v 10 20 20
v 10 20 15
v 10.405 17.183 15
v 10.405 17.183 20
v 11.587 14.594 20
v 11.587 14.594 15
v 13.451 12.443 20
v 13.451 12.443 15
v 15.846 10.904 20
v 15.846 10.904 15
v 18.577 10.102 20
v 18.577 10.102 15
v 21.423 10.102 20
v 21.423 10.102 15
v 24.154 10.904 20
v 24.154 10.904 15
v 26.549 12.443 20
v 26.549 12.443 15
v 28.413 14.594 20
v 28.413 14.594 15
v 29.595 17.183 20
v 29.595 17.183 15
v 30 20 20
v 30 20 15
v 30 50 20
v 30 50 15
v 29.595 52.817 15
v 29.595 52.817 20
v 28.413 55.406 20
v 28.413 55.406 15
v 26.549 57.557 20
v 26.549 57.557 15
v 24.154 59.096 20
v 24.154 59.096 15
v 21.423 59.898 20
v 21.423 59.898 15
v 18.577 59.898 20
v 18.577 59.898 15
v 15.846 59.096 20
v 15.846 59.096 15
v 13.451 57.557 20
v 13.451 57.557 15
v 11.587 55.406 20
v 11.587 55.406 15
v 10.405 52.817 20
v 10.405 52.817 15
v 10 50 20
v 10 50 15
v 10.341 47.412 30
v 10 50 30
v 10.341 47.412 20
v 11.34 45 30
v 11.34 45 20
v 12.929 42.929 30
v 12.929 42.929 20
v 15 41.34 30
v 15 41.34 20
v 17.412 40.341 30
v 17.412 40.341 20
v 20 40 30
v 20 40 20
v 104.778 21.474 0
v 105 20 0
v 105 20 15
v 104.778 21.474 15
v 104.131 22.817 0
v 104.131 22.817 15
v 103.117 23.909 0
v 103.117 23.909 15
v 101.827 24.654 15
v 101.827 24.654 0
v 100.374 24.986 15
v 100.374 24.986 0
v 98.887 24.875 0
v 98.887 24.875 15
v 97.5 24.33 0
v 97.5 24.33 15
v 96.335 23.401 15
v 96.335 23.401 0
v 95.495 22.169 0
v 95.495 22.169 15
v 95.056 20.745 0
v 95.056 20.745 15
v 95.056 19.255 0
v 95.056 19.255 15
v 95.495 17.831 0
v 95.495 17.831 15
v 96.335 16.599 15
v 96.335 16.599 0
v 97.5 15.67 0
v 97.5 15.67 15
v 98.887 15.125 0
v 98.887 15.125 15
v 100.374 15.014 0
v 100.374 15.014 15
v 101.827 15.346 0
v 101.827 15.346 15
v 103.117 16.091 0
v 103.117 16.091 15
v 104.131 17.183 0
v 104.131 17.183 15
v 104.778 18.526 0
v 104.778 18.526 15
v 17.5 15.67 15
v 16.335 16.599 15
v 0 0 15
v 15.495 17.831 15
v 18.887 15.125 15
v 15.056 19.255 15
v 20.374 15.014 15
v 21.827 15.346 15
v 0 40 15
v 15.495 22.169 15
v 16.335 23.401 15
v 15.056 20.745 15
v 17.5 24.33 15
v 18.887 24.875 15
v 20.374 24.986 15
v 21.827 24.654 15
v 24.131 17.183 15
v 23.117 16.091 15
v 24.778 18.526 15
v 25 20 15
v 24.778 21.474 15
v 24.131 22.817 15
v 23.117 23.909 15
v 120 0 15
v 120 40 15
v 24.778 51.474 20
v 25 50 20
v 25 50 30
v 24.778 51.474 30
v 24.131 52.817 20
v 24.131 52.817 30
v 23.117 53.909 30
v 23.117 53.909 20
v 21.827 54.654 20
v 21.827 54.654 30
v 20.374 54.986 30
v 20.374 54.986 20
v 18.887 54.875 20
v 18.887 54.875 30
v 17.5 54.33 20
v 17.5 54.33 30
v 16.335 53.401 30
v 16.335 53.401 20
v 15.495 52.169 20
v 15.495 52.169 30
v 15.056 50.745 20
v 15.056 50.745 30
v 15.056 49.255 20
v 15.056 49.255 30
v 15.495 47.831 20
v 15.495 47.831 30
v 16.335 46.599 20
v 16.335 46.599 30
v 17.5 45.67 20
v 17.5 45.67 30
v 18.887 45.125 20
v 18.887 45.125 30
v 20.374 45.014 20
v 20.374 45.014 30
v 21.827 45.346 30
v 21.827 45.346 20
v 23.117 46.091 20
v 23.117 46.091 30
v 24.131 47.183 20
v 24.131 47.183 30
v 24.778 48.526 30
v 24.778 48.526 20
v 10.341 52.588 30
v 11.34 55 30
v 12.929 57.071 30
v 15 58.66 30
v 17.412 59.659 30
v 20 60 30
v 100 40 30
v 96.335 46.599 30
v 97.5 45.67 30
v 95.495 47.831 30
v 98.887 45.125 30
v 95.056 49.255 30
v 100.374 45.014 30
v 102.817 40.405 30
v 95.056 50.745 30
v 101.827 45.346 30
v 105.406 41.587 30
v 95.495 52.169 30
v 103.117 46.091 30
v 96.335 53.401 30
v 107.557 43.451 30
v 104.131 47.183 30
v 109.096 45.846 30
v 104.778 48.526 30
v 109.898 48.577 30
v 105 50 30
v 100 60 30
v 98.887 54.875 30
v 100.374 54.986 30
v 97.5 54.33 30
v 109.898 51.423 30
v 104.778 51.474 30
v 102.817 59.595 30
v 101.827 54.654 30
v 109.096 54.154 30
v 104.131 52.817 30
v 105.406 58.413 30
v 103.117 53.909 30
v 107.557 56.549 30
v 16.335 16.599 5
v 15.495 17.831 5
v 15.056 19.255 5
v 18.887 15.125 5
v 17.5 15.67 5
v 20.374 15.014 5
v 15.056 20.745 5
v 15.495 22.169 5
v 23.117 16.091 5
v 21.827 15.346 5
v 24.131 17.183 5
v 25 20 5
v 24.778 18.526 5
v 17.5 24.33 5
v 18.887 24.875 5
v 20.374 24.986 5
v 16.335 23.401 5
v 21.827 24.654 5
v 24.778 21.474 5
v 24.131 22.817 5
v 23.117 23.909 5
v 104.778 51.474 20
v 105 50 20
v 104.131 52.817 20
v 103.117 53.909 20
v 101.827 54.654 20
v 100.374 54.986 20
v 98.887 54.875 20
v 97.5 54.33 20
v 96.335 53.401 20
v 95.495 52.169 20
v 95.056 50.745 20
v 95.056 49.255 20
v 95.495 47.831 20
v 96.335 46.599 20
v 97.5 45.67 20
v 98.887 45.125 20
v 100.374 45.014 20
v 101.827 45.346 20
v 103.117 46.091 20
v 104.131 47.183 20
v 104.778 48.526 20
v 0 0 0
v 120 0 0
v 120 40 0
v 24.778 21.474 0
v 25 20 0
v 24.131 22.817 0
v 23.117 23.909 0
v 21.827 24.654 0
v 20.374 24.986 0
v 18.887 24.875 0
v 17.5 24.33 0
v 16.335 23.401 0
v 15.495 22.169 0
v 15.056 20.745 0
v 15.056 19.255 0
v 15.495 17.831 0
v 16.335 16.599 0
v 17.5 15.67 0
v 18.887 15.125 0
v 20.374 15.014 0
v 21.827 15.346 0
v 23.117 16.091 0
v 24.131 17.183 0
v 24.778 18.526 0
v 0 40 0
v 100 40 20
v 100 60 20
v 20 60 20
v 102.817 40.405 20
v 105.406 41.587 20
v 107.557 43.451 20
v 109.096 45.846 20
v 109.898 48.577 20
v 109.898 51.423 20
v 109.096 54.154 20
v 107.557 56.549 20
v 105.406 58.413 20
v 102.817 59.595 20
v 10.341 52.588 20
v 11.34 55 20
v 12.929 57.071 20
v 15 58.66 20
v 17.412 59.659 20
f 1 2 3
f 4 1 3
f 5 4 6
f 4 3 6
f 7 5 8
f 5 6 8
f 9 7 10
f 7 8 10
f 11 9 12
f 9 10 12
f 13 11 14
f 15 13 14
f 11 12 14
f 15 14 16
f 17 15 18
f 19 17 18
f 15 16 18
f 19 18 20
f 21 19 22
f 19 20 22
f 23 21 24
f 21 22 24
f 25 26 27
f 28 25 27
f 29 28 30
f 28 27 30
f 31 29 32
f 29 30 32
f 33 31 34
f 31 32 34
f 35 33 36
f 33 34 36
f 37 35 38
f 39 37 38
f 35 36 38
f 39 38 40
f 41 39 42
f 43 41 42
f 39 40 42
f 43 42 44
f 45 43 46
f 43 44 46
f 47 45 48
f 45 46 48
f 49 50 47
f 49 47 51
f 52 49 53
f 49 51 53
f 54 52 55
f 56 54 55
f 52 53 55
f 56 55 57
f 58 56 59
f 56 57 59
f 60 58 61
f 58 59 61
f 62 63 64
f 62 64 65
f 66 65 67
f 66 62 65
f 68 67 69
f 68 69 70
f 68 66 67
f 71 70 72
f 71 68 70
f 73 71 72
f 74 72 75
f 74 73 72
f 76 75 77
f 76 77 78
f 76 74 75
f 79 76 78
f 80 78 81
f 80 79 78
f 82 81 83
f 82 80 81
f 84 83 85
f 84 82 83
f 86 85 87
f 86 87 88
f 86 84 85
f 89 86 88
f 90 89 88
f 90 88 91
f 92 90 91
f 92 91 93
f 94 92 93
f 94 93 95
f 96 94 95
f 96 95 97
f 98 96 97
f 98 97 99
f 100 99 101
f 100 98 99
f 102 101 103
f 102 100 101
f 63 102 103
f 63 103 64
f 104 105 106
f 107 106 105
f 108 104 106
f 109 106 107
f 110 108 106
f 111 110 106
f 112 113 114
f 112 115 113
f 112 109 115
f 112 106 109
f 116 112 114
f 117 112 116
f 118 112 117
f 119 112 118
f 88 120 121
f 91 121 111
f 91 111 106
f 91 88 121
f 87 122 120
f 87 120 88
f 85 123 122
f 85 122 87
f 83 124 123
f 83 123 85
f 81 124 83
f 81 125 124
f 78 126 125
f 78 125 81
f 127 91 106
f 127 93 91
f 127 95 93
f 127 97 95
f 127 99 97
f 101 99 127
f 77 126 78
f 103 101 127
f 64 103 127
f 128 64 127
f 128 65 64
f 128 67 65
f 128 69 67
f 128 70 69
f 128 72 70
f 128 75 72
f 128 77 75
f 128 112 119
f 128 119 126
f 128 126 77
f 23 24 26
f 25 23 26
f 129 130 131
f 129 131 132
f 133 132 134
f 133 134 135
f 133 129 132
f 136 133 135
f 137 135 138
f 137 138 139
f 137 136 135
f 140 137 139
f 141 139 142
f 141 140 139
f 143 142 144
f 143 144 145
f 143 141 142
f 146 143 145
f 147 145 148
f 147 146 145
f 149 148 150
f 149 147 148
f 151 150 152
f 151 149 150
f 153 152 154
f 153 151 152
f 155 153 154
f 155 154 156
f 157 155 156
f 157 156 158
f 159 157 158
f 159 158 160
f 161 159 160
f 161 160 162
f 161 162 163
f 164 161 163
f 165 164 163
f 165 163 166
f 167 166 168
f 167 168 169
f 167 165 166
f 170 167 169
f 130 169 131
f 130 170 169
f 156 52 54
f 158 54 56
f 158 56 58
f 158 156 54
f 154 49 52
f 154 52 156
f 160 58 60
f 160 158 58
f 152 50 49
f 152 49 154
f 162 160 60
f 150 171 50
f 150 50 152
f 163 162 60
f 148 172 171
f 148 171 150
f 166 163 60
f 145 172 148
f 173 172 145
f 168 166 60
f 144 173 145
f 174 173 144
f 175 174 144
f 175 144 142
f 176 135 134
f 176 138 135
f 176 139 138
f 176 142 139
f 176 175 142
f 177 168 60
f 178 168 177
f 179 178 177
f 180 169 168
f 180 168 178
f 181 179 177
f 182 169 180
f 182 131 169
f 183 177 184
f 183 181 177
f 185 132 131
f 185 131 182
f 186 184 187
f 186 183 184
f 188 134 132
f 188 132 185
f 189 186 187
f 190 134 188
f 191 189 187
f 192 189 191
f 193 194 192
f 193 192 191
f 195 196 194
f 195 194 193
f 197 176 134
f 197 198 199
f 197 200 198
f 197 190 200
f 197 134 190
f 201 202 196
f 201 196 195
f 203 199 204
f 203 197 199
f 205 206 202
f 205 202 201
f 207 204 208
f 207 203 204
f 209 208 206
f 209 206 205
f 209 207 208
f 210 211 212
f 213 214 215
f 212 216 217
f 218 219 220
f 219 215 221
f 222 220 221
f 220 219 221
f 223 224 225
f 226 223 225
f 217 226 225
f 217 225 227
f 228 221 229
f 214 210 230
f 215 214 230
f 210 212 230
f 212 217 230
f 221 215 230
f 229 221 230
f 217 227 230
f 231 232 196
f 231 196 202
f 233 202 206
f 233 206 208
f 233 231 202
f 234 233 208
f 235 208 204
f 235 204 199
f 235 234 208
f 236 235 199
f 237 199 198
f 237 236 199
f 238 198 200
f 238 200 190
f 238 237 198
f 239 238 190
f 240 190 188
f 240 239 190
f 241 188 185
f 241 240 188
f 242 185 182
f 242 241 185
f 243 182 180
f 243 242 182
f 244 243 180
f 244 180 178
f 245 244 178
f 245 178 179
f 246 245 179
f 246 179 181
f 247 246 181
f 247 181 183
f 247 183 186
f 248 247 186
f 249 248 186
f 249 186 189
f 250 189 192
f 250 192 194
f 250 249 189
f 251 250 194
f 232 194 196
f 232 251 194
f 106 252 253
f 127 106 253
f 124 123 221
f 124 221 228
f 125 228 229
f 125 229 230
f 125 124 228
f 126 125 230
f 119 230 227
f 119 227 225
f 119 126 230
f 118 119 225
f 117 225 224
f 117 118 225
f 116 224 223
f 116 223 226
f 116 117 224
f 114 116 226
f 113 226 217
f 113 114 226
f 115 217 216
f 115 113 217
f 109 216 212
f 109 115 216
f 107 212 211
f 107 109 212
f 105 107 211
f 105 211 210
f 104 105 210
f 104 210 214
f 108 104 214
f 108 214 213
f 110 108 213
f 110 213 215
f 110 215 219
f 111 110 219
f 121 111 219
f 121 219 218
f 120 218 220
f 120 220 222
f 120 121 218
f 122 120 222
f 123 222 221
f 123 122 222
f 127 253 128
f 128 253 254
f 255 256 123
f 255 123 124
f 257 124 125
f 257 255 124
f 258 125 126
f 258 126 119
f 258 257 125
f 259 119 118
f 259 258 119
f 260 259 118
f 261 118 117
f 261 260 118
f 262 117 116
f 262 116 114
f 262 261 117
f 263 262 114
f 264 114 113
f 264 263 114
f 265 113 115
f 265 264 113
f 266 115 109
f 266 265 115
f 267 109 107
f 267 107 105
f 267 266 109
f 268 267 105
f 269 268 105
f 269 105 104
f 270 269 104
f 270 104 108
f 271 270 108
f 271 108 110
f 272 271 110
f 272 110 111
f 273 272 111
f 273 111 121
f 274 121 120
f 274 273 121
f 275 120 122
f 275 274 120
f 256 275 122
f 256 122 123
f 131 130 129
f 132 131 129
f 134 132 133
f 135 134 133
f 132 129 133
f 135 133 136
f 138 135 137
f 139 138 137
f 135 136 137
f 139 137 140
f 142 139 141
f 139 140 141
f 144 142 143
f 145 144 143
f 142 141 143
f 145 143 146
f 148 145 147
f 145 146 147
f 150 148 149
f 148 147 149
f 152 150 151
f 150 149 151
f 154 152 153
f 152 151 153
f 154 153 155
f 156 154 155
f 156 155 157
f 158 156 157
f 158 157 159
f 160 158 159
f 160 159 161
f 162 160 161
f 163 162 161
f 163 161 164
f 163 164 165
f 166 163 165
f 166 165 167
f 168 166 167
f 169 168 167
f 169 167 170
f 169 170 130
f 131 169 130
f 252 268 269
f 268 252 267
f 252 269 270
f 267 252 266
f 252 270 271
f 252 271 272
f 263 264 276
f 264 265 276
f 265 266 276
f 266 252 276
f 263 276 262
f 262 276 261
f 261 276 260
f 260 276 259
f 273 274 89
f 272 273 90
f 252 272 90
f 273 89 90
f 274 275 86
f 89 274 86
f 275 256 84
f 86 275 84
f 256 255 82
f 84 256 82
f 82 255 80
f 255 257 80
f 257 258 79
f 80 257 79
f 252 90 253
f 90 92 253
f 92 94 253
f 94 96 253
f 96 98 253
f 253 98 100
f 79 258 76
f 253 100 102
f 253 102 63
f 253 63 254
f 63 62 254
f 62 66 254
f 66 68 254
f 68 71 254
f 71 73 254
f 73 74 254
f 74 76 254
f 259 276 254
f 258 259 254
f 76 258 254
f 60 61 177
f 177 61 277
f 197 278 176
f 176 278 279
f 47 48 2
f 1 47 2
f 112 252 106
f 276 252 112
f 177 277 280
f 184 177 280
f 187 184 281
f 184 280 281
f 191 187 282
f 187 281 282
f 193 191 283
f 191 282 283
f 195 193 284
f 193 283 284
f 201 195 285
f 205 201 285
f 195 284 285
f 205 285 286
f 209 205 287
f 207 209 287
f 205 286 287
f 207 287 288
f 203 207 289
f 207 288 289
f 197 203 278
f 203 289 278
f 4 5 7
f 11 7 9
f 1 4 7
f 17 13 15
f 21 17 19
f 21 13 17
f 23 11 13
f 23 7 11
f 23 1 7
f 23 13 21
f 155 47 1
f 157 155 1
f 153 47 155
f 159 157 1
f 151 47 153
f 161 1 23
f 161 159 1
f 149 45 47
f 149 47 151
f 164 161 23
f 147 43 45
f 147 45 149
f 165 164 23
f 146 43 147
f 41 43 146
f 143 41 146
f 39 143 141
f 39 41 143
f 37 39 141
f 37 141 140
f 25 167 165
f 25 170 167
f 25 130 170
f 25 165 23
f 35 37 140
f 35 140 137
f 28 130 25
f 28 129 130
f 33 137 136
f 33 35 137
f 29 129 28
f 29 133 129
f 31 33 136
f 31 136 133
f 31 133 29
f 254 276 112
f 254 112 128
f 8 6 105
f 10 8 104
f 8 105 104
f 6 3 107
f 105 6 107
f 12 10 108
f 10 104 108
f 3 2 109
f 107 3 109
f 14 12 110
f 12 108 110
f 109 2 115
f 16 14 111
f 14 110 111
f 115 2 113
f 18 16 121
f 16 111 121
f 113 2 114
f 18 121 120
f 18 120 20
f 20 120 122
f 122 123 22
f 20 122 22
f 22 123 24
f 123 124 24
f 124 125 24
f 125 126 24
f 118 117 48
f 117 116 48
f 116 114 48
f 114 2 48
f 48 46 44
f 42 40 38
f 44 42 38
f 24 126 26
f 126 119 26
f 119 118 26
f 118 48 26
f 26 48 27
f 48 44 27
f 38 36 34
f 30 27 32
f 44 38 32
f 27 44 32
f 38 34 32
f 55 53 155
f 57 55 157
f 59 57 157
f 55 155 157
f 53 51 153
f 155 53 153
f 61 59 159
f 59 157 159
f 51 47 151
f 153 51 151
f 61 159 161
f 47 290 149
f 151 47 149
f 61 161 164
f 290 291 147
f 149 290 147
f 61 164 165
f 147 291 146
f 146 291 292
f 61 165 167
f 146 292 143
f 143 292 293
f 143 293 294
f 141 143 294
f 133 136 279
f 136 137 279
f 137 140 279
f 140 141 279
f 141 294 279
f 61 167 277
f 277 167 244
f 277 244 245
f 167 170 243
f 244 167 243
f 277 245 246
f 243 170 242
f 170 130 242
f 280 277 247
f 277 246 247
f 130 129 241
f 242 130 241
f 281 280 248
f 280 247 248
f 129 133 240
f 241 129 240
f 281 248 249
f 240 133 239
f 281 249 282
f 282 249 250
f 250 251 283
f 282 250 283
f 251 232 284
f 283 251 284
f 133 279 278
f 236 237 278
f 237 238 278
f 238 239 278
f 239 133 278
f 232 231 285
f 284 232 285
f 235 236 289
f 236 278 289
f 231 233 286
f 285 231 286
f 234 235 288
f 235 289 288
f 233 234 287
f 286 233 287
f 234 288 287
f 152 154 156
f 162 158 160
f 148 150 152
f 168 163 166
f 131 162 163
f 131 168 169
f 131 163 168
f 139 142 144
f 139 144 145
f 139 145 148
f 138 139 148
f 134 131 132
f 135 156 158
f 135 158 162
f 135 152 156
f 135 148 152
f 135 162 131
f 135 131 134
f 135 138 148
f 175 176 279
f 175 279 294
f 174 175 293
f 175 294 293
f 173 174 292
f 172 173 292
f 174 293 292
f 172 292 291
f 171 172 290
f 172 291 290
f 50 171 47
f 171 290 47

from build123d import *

# Parameters (mm, degrees)
F0_W          = 120
F0_H          = 40
F0_R          = 5
F1_DEPTH      = 15
F2_R          = 5
F3_DEPTH      = 5
F4_DEPTH      = 15
F5_DEPTH      = 5
F5_DEPTH_BACK = 10
F6_R          = 5
F7_DEPTH      = 10


with BuildPart() as f1:
    # F0 (on Top) → F1 (new body)
    with BuildSketch(Plane.XY):
        with Locations((60, 20)):
            Rectangle(F0_W, F0_H)
        with Locations((20, 20)):
            Circle(F0_R, mode=Mode.SUBTRACT)
        with Locations((100, 20)):
            Circle(F0_R, mode=Mode.SUBTRACT)
    extrude(amount=F1_DEPTH)


with BuildPart() as f3:
    # F2 (on face) → F3 (new body)
    with BuildSketch(Plane.XY.offset(15)):
        with BuildLine():
            Line((30, 20), (30, 50))
            ThreePointArc((30, 50), (20, 60), (10, 50))
            Line((10, 50), (10, 20))
            ThreePointArc((10, 20), (20, 10), (30, 20))
        make_face()
        with Locations((20, 20)):
            Circle(F2_R, mode=Mode.SUBTRACT)
        with Locations((20, 50)):
            Circle(F2_R, mode=Mode.SUBTRACT)
    extrude(amount=F3_DEPTH)

    # F2 (on face) → F4 (join)
    with BuildSketch(Plane.XY.offset(15)):
        with Locations((20, 50)):
            Circle(F2_R)
    extrude(amount=F4_DEPTH)

    # F2 (on face) → F5 (join, two sides)
    with BuildSketch(Plane.XY.offset(15)) as f5_sk:
        with Locations((20, 20)):
            Circle(F2_R)
    extrude(amount=F5_DEPTH)
    extrude(f5_sk.sketch, amount=-F5_DEPTH_BACK)


with BuildPart() as f7:
    # F6 (on face) → F7 (new body)
    with BuildSketch(Plane.XY.offset(20)):
        with BuildLine():
            Line((100, 60), (20, 60))
            ThreePointArc((20, 60), (27.0710678119, 57.0710678119), (30, 50))
            Line((30, 50), (30, 40))
            Line((30, 40), (100, 40))
            ThreePointArc((100, 40), (110, 50), (100, 60))
        make_face()
        with Locations((100, 50)):
            Circle(F6_R, mode=Mode.SUBTRACT)
        with BuildLine():
            ThreePointArc((30, 50), (27.0710678119, 57.0710678119), (20, 60))
            ThreePointArc((20, 60), (12.9289321881, 57.0710678119), (10, 50))
            ThreePointArc((10, 50), (12.9289321881, 42.9289321881), (20, 40))
            Line((20, 40), (30, 40))
            Line((30, 40), (30, 50))
        make_face()
        with Locations((20, 50)):
            Circle(F6_R, mode=Mode.SUBTRACT)
    extrude(amount=F7_DEPTH)


solid = Compound([f1.part, f3.part, f7.part])
